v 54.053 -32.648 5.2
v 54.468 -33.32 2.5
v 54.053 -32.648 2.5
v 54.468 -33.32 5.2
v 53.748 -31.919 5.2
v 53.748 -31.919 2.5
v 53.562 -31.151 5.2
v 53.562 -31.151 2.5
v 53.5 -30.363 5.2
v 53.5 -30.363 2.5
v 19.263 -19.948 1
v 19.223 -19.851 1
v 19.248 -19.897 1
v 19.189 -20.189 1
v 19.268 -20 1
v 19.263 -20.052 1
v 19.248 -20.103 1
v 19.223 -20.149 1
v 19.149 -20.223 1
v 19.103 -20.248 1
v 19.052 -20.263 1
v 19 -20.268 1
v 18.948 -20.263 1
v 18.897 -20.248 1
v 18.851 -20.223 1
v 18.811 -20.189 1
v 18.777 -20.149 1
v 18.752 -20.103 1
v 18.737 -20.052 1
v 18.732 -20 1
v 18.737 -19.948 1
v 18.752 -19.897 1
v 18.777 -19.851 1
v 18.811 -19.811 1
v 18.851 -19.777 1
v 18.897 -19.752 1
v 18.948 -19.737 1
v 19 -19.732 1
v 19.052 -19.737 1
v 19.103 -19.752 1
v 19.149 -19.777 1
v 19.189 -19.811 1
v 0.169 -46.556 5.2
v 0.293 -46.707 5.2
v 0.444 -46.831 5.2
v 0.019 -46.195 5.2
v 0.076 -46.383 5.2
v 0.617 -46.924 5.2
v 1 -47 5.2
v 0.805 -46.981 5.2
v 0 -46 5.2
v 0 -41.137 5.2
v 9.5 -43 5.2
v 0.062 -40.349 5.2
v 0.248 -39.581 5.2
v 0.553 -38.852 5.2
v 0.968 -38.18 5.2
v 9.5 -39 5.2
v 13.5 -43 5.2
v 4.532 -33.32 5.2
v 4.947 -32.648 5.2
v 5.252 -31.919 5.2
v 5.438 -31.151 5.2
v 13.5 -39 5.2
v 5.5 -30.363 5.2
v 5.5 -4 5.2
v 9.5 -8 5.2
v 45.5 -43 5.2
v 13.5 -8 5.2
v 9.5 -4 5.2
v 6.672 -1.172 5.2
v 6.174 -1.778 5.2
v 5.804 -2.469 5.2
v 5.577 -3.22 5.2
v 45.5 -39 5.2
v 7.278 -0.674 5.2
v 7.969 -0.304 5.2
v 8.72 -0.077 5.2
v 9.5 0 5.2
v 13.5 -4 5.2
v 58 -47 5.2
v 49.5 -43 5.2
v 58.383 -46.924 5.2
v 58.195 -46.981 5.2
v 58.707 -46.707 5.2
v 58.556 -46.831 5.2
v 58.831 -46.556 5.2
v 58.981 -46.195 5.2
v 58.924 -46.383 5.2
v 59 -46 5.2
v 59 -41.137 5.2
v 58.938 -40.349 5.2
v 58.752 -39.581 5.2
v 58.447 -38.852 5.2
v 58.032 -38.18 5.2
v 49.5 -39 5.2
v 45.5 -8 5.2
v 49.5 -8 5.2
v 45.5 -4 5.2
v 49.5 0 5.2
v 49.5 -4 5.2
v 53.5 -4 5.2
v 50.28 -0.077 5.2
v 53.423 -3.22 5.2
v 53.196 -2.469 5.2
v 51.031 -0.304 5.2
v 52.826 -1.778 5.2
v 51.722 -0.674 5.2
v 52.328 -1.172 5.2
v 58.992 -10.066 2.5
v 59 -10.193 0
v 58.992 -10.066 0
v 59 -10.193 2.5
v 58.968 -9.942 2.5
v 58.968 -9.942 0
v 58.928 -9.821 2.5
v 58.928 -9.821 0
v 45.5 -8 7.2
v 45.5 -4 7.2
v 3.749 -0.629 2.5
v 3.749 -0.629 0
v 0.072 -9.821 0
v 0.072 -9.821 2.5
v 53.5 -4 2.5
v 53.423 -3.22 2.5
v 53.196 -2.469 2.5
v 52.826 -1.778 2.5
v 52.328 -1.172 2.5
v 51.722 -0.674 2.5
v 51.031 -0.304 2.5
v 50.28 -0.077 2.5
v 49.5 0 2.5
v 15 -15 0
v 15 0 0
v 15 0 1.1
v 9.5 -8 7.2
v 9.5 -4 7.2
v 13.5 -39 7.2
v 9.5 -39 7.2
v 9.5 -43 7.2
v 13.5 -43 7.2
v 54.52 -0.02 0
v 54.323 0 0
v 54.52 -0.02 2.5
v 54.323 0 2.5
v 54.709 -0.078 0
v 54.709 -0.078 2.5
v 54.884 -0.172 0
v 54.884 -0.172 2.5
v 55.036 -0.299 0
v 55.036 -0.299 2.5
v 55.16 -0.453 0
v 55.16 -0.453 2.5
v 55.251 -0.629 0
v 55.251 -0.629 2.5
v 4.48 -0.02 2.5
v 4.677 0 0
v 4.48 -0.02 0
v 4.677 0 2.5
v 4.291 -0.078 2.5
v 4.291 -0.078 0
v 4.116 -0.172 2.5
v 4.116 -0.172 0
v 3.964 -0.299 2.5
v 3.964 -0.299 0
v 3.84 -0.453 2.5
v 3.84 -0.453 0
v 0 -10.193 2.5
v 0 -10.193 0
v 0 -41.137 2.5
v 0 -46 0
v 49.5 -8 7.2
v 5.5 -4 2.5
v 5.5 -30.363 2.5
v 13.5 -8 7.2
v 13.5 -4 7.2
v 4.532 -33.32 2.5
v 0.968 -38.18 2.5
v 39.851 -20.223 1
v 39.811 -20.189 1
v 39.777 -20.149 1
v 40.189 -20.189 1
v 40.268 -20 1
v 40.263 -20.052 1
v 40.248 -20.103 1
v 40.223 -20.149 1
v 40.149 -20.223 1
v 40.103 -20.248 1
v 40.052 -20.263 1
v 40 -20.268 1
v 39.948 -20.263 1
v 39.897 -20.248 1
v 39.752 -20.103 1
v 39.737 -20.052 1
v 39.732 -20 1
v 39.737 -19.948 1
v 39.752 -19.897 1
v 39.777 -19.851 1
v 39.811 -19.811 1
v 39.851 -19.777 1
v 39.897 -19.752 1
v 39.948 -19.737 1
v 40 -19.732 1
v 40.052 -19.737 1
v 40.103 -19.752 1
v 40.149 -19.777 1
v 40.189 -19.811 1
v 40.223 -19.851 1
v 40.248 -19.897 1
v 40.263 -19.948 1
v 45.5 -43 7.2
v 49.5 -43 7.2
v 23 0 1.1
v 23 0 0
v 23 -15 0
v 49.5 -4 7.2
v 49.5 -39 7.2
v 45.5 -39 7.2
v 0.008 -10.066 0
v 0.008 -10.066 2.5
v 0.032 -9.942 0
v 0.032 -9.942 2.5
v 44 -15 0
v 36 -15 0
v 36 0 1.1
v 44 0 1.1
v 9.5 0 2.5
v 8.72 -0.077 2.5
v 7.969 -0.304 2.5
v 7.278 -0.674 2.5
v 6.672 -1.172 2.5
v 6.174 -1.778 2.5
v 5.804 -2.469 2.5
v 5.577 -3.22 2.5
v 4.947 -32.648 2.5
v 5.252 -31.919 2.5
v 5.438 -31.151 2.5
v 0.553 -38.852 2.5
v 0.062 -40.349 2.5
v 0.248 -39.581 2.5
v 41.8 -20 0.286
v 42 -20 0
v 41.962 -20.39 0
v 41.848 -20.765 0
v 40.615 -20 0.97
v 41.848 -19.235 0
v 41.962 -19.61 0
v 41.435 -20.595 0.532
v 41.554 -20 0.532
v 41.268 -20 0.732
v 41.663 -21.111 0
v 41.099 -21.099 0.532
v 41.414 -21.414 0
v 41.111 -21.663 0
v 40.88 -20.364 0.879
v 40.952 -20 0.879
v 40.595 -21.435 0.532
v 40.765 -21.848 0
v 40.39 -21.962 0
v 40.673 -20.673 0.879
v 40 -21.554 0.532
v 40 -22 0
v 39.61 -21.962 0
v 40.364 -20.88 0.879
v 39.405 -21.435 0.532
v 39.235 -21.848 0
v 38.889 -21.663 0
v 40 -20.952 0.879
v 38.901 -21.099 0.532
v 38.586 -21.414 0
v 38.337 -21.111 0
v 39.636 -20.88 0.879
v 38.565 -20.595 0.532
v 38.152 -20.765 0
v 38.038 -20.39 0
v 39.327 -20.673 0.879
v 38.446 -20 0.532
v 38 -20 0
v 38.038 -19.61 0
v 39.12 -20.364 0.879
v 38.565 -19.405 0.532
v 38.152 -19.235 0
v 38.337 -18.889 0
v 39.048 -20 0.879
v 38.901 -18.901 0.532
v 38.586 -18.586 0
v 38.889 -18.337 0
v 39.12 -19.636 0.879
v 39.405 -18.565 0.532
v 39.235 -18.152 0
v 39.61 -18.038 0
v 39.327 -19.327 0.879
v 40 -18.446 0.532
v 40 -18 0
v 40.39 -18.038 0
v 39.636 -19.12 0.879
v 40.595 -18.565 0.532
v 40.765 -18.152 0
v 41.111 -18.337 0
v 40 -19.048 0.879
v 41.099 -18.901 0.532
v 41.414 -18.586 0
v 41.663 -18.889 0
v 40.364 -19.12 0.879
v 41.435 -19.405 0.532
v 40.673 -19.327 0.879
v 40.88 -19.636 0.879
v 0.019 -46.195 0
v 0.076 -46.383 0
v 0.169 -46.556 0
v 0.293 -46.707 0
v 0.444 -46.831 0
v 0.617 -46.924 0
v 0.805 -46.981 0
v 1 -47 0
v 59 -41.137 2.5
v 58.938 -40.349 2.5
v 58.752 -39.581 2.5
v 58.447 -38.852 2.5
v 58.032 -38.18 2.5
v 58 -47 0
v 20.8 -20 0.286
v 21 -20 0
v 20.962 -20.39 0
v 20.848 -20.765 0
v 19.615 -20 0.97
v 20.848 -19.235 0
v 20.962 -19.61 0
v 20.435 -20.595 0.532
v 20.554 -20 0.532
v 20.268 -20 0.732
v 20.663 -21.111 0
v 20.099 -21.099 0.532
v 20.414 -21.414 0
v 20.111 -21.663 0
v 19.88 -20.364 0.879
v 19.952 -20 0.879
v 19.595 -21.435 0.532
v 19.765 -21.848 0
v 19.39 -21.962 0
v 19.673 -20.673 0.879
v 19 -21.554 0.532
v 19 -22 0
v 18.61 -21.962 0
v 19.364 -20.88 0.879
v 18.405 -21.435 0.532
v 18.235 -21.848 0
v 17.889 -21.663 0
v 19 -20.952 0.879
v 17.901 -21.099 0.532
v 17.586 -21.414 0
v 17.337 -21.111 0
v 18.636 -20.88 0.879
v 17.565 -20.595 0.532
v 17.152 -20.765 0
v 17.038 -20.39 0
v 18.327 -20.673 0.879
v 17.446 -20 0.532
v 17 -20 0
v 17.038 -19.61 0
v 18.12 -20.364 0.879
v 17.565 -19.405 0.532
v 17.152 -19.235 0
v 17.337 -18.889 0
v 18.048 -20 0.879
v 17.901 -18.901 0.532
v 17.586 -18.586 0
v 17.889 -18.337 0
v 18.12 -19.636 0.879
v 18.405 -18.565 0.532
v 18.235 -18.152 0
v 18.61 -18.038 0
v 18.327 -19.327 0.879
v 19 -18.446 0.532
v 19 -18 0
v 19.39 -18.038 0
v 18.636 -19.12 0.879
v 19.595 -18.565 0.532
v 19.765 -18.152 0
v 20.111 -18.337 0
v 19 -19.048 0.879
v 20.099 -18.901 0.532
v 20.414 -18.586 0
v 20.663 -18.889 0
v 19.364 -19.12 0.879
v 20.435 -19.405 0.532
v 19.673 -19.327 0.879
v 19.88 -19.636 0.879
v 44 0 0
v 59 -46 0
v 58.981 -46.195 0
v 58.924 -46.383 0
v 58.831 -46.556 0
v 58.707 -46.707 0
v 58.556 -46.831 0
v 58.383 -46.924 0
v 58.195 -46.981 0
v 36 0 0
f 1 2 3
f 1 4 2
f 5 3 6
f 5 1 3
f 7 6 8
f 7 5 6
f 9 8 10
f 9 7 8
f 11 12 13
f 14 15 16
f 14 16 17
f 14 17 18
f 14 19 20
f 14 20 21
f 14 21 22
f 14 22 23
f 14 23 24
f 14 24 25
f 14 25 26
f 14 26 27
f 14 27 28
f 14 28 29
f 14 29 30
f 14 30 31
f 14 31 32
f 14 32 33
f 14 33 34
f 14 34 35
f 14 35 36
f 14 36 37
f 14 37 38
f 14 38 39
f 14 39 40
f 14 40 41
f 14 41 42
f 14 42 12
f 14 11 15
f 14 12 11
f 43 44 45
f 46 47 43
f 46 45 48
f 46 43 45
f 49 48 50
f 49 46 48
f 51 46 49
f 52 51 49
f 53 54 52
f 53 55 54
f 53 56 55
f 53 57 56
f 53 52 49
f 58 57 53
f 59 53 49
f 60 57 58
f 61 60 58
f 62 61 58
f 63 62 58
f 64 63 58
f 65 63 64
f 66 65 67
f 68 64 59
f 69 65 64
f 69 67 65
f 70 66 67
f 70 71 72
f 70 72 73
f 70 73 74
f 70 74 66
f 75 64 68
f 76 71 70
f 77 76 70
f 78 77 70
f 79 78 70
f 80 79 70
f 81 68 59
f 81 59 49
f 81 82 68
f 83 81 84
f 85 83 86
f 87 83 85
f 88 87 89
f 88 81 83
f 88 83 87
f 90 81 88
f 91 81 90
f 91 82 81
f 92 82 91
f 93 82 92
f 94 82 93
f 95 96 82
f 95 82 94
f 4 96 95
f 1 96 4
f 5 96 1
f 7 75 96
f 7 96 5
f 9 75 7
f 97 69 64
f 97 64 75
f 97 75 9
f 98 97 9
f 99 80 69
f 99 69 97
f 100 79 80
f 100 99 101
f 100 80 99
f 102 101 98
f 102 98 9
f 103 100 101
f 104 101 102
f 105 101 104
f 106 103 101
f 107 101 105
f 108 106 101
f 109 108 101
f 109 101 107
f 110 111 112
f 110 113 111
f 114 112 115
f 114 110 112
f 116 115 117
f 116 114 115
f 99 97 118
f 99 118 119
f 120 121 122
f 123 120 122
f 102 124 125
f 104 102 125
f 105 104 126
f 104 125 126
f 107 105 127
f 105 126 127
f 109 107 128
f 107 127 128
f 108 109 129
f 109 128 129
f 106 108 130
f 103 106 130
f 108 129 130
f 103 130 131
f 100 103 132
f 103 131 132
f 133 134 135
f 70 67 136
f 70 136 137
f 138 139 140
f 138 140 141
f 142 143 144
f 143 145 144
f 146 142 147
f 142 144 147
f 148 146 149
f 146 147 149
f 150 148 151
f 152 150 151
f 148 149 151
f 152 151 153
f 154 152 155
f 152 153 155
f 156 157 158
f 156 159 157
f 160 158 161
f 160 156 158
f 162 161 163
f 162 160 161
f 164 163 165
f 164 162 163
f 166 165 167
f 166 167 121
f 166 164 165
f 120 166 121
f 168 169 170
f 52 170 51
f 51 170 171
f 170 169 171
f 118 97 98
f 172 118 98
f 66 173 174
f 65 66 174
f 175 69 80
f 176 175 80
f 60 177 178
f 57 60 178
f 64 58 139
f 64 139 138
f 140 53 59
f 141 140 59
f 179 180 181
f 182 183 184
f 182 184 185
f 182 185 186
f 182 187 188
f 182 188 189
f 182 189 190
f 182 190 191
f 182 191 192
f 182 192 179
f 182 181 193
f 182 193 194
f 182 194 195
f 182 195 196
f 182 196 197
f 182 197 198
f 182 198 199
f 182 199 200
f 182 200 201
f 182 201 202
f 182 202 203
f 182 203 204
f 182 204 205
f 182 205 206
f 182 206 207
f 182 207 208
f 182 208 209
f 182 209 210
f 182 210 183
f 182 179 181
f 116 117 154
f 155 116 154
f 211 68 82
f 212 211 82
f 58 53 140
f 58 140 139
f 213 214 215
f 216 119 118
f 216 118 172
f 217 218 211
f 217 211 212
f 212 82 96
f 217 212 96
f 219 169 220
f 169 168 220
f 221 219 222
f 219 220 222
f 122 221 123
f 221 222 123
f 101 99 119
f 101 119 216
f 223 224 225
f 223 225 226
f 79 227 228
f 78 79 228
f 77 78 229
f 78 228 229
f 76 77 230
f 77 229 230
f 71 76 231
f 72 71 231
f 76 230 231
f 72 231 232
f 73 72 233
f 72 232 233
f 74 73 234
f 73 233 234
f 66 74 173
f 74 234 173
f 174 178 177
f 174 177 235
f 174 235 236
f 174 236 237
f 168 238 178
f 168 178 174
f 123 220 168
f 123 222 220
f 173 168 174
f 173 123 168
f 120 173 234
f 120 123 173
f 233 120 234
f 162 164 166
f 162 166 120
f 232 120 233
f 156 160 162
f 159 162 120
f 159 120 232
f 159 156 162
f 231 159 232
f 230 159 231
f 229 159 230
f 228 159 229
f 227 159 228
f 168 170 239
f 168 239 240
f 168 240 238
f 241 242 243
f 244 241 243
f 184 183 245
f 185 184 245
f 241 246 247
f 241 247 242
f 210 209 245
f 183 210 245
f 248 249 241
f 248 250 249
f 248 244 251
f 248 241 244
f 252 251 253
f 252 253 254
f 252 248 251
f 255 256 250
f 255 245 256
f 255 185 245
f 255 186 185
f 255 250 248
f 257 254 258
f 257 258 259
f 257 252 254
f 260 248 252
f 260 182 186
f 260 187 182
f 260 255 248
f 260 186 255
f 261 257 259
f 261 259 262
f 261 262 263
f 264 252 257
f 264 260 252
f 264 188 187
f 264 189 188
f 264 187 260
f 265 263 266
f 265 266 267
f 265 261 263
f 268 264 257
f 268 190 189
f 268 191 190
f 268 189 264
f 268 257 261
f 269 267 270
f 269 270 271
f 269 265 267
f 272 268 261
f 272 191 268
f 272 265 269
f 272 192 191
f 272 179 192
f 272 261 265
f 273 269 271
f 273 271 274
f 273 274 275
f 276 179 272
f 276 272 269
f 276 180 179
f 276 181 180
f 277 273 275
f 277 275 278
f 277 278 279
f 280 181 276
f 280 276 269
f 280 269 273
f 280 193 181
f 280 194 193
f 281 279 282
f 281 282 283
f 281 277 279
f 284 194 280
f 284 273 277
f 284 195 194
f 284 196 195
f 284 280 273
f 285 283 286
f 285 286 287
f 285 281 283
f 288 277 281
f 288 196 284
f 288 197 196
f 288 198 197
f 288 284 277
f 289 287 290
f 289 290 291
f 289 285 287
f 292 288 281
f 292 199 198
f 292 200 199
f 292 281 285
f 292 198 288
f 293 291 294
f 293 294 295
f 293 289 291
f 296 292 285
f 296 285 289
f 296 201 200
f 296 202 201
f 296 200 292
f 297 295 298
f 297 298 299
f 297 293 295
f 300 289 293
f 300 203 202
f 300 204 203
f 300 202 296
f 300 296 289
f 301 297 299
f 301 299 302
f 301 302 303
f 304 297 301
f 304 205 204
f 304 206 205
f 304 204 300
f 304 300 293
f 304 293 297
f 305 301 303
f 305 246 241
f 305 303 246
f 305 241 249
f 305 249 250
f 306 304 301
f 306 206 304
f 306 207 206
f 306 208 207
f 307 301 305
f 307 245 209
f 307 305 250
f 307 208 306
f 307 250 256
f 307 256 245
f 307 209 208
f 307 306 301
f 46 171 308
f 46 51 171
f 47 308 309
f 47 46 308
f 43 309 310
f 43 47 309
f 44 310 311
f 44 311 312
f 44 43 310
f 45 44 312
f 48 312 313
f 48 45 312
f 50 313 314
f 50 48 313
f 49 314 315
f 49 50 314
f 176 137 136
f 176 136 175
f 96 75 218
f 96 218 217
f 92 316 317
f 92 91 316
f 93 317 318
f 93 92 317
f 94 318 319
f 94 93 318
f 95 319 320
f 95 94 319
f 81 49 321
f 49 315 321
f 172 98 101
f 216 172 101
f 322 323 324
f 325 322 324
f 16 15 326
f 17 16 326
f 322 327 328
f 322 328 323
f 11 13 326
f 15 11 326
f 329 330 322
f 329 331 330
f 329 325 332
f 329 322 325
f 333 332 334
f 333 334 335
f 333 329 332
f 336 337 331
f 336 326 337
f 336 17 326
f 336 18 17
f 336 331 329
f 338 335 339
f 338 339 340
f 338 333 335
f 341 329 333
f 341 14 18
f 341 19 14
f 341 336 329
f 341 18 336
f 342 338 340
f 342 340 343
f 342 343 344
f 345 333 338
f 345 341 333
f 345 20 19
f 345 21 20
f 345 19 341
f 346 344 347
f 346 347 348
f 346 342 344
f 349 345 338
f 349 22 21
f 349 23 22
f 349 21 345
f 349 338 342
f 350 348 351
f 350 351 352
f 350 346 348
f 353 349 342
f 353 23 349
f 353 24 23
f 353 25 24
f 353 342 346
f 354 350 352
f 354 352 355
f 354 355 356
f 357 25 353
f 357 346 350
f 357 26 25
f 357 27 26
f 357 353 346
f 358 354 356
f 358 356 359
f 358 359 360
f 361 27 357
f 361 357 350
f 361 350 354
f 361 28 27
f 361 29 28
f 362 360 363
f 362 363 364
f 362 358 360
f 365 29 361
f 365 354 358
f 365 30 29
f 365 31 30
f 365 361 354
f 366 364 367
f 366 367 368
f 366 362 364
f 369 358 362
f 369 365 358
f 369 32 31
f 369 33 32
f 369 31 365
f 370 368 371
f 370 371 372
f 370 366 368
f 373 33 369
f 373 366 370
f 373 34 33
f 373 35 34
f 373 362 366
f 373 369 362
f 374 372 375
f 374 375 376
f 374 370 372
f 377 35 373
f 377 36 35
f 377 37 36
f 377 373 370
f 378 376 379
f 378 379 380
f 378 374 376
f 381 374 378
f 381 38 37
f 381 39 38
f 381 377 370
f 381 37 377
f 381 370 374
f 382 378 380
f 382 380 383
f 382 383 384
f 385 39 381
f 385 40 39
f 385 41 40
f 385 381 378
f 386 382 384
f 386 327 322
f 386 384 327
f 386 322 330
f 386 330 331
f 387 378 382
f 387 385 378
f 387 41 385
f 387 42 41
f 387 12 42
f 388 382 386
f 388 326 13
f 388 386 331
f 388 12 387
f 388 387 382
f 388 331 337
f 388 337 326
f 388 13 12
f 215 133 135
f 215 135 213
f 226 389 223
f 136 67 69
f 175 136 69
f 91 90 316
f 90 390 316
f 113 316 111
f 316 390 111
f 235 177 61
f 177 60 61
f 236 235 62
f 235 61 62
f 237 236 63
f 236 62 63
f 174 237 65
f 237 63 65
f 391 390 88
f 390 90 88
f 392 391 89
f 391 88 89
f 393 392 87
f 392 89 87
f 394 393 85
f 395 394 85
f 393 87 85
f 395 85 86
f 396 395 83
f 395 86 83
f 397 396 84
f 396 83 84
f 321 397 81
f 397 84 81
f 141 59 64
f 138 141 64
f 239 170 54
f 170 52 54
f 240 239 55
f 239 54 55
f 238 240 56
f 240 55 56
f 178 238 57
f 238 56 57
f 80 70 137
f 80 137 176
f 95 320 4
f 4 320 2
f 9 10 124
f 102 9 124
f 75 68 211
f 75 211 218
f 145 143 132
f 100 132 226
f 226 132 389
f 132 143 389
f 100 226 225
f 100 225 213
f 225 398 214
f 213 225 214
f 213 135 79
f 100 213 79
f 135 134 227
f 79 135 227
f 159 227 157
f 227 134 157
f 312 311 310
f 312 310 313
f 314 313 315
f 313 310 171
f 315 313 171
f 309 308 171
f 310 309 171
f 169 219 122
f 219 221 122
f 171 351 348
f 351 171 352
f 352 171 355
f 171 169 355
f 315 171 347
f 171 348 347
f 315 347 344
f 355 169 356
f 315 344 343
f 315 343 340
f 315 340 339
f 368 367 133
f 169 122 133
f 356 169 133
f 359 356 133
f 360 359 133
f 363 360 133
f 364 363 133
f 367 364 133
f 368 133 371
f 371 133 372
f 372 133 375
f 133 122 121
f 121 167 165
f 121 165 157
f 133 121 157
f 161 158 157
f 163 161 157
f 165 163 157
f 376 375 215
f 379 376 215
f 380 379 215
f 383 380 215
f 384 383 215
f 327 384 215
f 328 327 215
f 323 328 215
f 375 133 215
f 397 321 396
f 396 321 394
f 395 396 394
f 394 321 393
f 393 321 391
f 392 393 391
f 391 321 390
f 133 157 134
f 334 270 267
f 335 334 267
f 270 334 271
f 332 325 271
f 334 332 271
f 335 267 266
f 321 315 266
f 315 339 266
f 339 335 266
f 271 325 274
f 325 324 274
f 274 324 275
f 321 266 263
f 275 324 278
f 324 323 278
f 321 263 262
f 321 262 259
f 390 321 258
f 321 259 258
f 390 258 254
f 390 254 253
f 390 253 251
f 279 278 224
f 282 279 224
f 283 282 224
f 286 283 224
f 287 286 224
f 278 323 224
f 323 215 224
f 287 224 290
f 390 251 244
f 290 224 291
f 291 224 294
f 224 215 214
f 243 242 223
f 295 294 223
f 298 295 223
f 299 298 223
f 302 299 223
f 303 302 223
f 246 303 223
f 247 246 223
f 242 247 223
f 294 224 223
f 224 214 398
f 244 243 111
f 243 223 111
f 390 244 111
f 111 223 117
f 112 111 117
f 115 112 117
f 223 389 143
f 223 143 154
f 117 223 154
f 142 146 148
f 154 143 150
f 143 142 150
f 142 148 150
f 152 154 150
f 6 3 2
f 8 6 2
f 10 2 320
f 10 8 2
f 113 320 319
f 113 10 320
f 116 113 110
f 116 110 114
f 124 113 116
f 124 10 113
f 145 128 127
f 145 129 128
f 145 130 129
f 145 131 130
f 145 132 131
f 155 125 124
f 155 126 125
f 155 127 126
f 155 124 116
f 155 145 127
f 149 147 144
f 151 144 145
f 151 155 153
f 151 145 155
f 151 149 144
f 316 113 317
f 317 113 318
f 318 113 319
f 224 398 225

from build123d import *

# Parameters (mm, degrees)
F1_DEPTH    = 2.5
F3_DEPTH    = 2.7
F4_R        = 1
F5_R        = 5
F7_R        = 2
F8_DEPTH    = 1
F6_W        = 8
F6_H        = 15
F9_DEPTH    = 1.1
F10_SIZE2   = 1.09999
F10_SIZE    = 14.99999
F10_2_SIZE2 = 1.09999
F10_2_SIZE  = 14.99999
F13_W       = 4
F13_H       = 4
F14_DEPTH   = 2


# Not quite as in the source:
# - a fillet or chamfer that OpenCascade refuses, or shapes differently, is made with other operations: its cross-section is extruded or revolved along the edge and cut away or added
# - two fillets or chamfers of one size are made in one step
# - a fillet or chamfer is up to 0.001 mm smaller than in the source, because OpenCascade refuses the exact size


with BuildPart() as f1:
    # F0 (on Top) → F1 (new body)
    with BuildSketch(Plane.XY):
        Polygon((55, 0), (4, 0), (0, -10), (0, -47), (59, -47), (59, -10), align=None)
    extrude(amount=F1_DEPTH)

    # F2 (on face) → F3 (join)
    with BuildSketch(Plane.XY.offset(2.5)):
        with BuildLine():
            Line((0, -39.5), (0, -47))
            Line((0, -47), (59, -47))
            Line((59, -47), (59, -39.5))
            Line((59, -39.5), (53.5, -32))
            Line((53.5, -32), (53.5, -4))
            ThreePointArc((53.5, -4), (52.3284271247, -1.1715728753), (49.5, 0))
            Line((49.5, 0), (9.5, 0))
            ThreePointArc((9.5, 0), (6.6715728753, -1.1715728753), (5.5, -4))
            Line((5.5, -4), (5.5, -32))
            Line((5.5, -32), (0, -39.5))
        make_face()
    extrude(amount=F3_DEPTH)

    # F4
    f4_edges = [f1.edges().sort_by_distance(p)[0] for p in [
        (0, -47, 2.6),
        (59, -47, 2.6),
        (4, 0, 1.25),
        (55, 0, 1.25),
        (59, -10, 1.25),
        (0, -10, 1.25),
    ]]
    fillet(f4_edges, radius=F4_R)

    # F5
    f5_edges = [f1.edges().sort_by_distance(p)[0] for p in [
        (0, -39.5, 3.85),
        (59, -39.5, 3.85),
        (53.5, -32, 3.85),
        (5.5, -32, 3.85),
    ]]
    fillet(f5_edges, radius=F5_R)

    # F7 (on face) → F8 (cut)
    with BuildSketch(Plane(origin=(0, 0, 0), x_dir=(1, 0, 0), z_dir=(0, 0, -1))):
        with Locations((19, 20)):
            Circle(F7_R)
        with Locations((40, 20)):
            Circle(F7_R)
    extrude(amount=-F8_DEPTH, mode=Mode.SUBTRACT)

    # F6 (on face) → F9 (cut)
    with BuildSketch(Plane(origin=(0, 0, 0), x_dir=(1, 0, 0), z_dir=(0, 0, -1))):
        with Locations((40, 7.5)):
            Rectangle(F6_W, F6_H)
        with Locations((19, 7.5)):
            Rectangle(F6_W, F6_H)
    extrude(amount=-F9_DEPTH, mode=Mode.SUBTRACT)

    # F10 (size 15 and 1.1 in the source; OpenCascade refuses exactly that, so slightly less here)
    f10_edges = [f1.edges().sort_by_distance(p)[0] for p in [
        (40, -15, 1.1),
    ]]
    f10_side = f1.faces().sort_by_distance((40, -7.5, 1.1))[0]
    chamfer(f10_edges, length=F10_SIZE, length2=F10_SIZE2, reference=f10_side)

    # F10#2 (size 15 and 1.1 in the source; OpenCascade refuses exactly that, so slightly less here)
    f10_2_edges = [f1.edges().sort_by_distance(p)[0] for p in [
        (19, -15, 1.1),
    ]]
    f10_2_side = f1.faces().sort_by_distance((19, -7.5, 1.1))[0]
    chamfer(f10_2_edges, length=F10_2_SIZE, length2=F10_2_SIZE2, reference=f10_2_side)

    # F12: fillet of radius 2 on 2 edges, made by hand

    # F12_s1 → F12_t2 (revolve)
    with BuildSketch(Plane.XZ.offset(20)):
        with BuildLine():
            ThreePointArc((42, 0), (41.2679491924, 0.7320508076), (40.2679491924, 1))
            Line((40.2679491924, 1), (42, 1))
            Line((42, 1), (42, 0))
        make_face()
    revolve(axis=Axis((40, -20, 1), (0, 0, -1)))

    # F12_s3 → F12_t4 (revolve)
    with BuildSketch(Plane.XZ.offset(20)):
        with BuildLine():
            ThreePointArc((21, 0), (20.2679491924, 0.7320508076), (19.2679491924, 1))
            Line((19.2679491924, 1), (21, 1))
            Line((21, 1), (21, 0))
        make_face()
    revolve(axis=Axis((19, -20, 1), (0, 0, -1)))

    # F13 (on face) → F14 (join)
    with BuildSketch(Plane.XY.offset(5.2)):
        with Locations((11.5, -6)):
            Rectangle(F13_W, F13_H)
        with Locations((11.5, -41)):
            Rectangle(F13_W, F13_H)
        with Locations((47.5, -6)):
            Rectangle(F13_W, F13_H)
        with Locations((47.5, -41)):
            Rectangle(F13_W, F13_H)
    extrude(amount=F14_DEPTH)


solid = f1.part
